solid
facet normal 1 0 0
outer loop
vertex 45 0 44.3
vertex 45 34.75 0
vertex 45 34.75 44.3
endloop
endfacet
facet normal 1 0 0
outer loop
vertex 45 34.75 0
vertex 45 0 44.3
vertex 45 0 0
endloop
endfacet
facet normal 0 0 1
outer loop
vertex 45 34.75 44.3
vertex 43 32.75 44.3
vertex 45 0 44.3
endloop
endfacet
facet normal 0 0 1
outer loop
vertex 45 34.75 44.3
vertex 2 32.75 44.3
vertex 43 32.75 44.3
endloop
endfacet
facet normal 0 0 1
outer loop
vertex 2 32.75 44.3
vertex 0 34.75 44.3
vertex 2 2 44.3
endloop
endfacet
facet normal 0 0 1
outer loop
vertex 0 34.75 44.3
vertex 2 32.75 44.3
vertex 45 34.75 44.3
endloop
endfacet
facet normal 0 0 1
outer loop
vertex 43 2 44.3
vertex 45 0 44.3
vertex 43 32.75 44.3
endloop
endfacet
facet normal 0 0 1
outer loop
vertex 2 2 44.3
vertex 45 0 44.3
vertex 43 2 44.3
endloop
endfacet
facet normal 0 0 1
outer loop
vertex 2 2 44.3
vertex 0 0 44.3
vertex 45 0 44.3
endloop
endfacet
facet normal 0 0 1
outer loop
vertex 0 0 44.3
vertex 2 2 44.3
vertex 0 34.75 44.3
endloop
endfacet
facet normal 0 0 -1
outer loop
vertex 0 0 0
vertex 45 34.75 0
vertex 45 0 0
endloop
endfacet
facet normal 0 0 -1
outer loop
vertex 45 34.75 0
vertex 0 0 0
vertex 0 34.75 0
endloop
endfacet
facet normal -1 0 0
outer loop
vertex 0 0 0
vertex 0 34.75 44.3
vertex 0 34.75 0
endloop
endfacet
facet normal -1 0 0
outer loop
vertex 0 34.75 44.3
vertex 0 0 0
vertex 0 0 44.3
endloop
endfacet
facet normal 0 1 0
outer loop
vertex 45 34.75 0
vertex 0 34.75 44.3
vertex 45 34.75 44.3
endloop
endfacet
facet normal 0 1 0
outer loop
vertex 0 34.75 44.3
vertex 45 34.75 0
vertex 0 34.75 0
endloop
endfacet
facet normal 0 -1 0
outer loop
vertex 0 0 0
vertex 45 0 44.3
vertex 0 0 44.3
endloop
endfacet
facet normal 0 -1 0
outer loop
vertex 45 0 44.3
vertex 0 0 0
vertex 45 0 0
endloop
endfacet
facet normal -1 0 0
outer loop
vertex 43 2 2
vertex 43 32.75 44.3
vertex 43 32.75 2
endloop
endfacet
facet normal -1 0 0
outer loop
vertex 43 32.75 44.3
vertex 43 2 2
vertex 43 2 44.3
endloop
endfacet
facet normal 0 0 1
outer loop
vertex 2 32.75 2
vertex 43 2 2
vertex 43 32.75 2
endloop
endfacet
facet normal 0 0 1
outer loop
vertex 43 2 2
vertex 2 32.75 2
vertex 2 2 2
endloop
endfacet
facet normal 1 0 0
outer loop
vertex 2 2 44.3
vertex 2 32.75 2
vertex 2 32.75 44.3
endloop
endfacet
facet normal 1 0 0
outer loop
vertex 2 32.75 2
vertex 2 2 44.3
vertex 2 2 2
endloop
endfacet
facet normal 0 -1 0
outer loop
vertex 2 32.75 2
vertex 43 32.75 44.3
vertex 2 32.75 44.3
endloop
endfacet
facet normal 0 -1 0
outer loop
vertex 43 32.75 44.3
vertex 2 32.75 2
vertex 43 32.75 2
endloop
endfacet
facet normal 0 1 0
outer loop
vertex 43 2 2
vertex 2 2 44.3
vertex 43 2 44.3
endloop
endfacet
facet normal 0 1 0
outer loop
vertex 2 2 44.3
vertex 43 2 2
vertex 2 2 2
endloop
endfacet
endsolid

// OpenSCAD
// Dimensions
batteryWidth = 10.25;
batteryHeight = 42.3;

thickness = 2;

rows = 4;
columns = 3;

difference () {
  cube([(rows * batteryWidth) + (2 * thickness), (columns * batteryWidth) + (2 * thickness), batteryHeight + thickness]);

  translate([thickness, thickness, thickness]) {
    cube([rows * batteryWidth, columns * batteryWidth, batteryHeight]);
  }
}
